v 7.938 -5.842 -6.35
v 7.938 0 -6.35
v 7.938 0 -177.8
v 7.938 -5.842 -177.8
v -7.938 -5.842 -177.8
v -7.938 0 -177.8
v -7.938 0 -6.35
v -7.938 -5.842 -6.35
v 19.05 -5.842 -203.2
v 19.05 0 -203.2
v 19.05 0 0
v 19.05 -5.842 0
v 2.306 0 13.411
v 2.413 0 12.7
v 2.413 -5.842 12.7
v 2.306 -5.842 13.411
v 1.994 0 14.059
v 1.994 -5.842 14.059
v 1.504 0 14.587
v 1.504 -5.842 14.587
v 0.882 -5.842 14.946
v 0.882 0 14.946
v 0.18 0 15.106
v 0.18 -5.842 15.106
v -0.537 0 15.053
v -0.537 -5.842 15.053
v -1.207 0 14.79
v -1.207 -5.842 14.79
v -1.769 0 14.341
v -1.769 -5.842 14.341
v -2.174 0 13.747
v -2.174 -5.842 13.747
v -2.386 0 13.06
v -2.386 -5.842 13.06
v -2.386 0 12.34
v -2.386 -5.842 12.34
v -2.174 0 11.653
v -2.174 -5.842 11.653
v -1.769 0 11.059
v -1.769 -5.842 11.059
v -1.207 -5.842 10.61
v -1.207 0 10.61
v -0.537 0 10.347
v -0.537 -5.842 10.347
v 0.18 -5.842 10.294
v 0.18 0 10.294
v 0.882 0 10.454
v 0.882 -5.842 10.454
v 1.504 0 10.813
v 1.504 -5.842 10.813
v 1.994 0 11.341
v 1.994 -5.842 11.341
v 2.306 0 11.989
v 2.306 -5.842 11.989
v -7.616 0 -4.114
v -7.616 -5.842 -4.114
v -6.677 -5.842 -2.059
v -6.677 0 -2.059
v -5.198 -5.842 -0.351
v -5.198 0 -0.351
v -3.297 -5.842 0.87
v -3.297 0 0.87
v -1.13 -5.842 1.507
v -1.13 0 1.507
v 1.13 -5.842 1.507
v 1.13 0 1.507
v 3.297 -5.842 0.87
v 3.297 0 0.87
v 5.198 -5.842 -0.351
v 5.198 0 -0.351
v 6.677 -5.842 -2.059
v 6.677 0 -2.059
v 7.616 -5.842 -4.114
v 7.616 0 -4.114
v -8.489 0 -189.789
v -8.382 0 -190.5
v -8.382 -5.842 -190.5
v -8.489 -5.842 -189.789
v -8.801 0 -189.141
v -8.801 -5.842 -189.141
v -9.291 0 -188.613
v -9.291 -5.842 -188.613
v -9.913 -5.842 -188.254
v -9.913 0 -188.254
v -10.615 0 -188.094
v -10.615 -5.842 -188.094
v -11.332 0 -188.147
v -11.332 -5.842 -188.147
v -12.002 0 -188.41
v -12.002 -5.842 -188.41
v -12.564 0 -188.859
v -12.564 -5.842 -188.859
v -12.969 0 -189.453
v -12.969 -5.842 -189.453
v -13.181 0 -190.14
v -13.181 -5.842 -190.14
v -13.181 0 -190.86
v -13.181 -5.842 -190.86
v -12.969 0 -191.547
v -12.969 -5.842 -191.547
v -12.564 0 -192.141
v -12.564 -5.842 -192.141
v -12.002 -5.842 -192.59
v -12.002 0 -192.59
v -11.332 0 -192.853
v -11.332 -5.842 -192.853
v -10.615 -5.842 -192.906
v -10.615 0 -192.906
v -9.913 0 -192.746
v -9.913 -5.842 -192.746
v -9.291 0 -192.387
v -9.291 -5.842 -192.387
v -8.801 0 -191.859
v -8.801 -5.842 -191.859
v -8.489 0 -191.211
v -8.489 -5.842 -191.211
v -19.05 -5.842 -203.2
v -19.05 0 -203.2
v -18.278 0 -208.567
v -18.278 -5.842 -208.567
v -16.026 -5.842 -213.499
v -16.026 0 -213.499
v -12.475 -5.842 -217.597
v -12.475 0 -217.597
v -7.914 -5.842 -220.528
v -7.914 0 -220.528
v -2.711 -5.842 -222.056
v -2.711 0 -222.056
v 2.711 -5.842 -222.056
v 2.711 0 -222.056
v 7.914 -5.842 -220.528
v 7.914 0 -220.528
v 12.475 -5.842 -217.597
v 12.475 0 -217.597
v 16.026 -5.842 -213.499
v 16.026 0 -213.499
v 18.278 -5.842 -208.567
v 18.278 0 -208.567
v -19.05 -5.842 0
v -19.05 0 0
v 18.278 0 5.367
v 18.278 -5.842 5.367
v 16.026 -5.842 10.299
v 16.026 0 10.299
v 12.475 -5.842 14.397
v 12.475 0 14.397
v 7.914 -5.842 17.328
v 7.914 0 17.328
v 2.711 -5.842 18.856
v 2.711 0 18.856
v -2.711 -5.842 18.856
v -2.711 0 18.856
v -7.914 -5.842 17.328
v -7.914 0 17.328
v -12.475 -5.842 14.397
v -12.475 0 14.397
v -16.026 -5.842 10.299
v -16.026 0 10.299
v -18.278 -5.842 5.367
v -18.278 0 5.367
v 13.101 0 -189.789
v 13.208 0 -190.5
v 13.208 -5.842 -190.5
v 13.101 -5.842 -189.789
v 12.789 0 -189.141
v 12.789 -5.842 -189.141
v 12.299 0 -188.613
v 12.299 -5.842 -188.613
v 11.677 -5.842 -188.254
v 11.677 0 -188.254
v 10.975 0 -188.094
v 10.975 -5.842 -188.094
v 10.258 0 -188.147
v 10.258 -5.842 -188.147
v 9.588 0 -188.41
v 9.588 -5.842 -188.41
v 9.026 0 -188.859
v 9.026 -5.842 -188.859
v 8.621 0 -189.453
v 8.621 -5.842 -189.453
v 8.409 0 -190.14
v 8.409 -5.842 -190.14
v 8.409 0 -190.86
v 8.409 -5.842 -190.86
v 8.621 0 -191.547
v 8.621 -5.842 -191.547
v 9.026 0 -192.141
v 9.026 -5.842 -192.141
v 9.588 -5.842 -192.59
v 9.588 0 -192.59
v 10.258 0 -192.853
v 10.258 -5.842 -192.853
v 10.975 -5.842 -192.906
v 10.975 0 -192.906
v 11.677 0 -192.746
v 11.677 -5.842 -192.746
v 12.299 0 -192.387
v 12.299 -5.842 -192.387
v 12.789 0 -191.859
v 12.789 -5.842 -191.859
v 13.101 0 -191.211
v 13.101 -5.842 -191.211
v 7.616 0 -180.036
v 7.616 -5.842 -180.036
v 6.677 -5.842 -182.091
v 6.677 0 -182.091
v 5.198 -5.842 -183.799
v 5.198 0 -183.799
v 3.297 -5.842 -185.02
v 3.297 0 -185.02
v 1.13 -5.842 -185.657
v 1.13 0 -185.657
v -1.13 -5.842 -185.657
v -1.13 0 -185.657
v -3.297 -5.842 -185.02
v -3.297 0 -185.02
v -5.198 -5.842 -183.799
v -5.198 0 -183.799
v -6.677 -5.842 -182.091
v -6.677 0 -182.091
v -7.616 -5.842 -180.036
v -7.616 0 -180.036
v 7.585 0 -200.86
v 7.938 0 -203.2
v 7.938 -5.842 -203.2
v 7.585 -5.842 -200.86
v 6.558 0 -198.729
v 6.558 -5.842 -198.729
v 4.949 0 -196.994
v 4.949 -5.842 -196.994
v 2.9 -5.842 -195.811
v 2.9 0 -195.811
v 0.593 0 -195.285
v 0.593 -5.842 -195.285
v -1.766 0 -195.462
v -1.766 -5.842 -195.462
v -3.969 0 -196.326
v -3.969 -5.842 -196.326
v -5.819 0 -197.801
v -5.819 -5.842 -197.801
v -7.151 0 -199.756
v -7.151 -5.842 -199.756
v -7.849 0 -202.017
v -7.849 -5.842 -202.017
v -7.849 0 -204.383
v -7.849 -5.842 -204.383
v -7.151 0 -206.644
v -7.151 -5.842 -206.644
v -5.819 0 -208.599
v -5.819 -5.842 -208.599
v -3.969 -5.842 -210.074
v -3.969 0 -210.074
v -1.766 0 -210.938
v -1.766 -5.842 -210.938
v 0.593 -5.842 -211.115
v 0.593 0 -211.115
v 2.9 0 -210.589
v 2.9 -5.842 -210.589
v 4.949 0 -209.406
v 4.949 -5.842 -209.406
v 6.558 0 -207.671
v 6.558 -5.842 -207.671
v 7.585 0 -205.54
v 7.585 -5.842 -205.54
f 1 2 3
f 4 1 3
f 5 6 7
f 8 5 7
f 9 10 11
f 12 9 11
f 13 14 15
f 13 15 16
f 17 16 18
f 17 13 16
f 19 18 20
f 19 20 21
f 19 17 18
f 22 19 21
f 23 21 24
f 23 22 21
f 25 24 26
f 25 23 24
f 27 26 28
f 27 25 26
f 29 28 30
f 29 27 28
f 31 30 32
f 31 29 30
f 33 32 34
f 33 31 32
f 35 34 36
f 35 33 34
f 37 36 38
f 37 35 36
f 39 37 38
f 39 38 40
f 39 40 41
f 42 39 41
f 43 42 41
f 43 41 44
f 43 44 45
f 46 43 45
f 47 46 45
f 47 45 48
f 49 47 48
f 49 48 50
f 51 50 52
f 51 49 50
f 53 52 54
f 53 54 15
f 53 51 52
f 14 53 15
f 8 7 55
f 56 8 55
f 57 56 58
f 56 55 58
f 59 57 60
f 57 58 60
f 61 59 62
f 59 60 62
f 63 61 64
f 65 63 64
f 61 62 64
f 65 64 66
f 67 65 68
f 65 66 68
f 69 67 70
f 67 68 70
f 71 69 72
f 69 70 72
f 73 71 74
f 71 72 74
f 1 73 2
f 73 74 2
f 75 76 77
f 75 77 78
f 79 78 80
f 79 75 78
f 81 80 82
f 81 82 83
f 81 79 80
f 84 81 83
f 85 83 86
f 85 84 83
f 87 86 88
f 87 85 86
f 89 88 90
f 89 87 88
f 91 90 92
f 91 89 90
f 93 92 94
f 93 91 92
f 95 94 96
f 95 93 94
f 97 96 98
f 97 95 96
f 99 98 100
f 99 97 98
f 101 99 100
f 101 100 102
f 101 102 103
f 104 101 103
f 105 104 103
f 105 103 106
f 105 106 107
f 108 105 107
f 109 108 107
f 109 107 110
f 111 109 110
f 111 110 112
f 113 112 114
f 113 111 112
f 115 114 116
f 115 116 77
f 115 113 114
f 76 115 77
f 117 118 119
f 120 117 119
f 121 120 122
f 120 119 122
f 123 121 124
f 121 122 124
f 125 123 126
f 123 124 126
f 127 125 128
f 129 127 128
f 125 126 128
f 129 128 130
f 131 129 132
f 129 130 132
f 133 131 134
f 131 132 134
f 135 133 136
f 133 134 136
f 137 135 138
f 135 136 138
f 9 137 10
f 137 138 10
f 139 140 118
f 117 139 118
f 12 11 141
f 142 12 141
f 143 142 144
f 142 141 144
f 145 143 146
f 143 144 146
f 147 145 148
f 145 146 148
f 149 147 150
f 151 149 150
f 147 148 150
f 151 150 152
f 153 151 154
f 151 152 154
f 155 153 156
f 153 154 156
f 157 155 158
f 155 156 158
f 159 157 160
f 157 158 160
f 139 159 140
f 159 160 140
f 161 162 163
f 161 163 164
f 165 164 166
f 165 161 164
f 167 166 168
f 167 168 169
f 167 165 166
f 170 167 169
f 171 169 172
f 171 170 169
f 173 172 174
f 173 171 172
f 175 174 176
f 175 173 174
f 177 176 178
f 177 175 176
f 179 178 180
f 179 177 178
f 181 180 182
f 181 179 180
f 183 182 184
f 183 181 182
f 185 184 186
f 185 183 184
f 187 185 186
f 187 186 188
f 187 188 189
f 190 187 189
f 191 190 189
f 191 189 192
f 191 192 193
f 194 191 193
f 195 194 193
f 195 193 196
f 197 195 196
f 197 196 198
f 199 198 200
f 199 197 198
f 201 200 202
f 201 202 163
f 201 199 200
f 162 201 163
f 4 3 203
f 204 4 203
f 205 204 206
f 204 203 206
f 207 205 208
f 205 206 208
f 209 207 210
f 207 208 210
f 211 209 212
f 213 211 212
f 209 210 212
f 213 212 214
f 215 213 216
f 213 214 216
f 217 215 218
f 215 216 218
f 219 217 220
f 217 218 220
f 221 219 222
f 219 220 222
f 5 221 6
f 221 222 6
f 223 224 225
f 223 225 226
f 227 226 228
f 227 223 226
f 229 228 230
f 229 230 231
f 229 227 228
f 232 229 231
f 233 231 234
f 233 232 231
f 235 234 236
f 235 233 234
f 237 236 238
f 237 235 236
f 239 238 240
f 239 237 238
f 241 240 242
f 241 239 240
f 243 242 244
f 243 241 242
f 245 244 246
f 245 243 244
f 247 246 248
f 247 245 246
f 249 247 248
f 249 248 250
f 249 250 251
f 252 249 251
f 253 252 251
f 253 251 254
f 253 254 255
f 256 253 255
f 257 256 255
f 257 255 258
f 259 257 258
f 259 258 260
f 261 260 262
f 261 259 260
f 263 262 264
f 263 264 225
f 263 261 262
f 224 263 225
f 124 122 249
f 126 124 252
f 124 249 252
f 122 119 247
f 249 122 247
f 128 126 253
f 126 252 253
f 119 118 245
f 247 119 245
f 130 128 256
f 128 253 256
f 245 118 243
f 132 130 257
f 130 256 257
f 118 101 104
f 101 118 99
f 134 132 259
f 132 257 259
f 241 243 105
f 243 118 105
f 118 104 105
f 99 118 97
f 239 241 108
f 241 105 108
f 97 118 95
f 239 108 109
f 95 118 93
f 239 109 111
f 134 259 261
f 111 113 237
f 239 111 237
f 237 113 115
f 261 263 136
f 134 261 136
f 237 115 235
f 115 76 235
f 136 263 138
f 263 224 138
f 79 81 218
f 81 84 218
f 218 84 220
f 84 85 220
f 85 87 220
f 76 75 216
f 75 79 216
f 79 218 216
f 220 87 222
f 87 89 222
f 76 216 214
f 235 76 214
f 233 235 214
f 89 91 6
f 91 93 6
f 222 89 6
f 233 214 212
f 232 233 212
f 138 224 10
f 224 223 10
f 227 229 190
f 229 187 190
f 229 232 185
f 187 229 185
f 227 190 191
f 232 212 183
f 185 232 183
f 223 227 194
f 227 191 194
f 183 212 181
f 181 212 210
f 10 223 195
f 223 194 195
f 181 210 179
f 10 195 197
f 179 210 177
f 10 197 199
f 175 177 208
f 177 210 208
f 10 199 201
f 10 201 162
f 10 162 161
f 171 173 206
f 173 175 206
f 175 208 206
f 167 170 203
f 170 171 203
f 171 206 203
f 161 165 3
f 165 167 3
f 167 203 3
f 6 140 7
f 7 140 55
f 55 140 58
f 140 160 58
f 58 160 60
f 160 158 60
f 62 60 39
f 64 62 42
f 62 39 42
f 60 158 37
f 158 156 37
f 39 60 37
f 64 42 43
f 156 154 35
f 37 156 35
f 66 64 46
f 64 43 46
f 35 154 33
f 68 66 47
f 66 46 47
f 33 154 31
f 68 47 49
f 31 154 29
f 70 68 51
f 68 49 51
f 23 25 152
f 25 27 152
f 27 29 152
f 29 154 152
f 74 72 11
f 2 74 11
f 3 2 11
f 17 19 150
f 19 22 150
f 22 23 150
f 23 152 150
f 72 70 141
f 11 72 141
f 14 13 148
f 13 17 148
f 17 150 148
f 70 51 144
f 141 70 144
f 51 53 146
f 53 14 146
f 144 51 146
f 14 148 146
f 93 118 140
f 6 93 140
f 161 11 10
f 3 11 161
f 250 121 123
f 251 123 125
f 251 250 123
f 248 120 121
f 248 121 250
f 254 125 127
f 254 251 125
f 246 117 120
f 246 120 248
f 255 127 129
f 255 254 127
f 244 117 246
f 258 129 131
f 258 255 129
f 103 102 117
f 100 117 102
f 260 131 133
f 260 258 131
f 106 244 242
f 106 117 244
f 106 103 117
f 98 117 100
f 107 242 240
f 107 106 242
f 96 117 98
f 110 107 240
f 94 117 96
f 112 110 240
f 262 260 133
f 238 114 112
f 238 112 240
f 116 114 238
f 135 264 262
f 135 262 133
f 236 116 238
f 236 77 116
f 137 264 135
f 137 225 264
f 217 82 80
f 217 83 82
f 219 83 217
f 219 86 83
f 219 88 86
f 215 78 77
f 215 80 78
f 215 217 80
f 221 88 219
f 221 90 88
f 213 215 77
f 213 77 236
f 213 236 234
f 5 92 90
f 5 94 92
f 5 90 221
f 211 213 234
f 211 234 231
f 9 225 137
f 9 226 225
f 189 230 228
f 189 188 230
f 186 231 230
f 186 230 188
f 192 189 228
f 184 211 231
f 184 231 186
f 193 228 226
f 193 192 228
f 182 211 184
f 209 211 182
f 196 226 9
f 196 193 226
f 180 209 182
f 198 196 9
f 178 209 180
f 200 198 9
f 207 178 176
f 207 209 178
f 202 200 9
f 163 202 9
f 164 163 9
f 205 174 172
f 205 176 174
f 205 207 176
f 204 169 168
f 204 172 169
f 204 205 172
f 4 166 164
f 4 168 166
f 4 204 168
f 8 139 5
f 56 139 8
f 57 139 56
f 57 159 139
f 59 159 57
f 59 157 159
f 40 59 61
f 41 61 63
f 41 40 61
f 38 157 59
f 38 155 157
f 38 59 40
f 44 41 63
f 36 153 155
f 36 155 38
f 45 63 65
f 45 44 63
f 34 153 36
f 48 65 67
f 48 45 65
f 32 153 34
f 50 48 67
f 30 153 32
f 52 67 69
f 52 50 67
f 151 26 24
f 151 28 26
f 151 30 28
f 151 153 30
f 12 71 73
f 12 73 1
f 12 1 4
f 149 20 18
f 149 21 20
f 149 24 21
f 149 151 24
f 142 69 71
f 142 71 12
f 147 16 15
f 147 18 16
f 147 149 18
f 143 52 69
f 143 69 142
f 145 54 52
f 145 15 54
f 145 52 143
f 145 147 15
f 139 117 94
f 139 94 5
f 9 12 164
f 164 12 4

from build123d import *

# Parameters (mm, degrees)
F0_R     = 2.413
F0_R_2   = 7.9375
F1_DEPTH = 5.842


with BuildPart() as f1:
    # F0 (on Front) → F1 (new body)
    with BuildSketch(Plane.XZ):
        with BuildLine():
            Line((-19.05, 0), (-19.05, -203.2))
            ThreePointArc((-19.05, -203.2), (0, -222.25), (19.05, -203.2))
            Line((19.05, -203.2), (19.05, 0))
            ThreePointArc((19.05, 0), (0, 19.05), (-19.05, 0))
        make_face()
        with Locations((-10.795, -190.5)):
            Circle(F0_R, mode=Mode.SUBTRACT)
        with Locations((0, -203.2)):
            Circle(F0_R_2, mode=Mode.SUBTRACT)
        with Locations((10.795, -190.5)):
            Circle(F0_R, mode=Mode.SUBTRACT)
        with BuildLine():
            ThreePointArc((7.9375, -177.8), (0, -185.7375), (-7.9375, -177.8))
            Line((-7.9375, -177.8), (-7.9375, -6.35))
            ThreePointArc((-7.9375, -6.35), (0, 1.5875), (7.9375, -6.35))
            Line((7.9375, -6.35), (7.9375, -177.8))
        make_face(mode=Mode.SUBTRACT)
        with Locations((0, 12.7)):
            Circle(F0_R, mode=Mode.SUBTRACT)
    extrude(amount=F1_DEPTH)


solid = f1.part
